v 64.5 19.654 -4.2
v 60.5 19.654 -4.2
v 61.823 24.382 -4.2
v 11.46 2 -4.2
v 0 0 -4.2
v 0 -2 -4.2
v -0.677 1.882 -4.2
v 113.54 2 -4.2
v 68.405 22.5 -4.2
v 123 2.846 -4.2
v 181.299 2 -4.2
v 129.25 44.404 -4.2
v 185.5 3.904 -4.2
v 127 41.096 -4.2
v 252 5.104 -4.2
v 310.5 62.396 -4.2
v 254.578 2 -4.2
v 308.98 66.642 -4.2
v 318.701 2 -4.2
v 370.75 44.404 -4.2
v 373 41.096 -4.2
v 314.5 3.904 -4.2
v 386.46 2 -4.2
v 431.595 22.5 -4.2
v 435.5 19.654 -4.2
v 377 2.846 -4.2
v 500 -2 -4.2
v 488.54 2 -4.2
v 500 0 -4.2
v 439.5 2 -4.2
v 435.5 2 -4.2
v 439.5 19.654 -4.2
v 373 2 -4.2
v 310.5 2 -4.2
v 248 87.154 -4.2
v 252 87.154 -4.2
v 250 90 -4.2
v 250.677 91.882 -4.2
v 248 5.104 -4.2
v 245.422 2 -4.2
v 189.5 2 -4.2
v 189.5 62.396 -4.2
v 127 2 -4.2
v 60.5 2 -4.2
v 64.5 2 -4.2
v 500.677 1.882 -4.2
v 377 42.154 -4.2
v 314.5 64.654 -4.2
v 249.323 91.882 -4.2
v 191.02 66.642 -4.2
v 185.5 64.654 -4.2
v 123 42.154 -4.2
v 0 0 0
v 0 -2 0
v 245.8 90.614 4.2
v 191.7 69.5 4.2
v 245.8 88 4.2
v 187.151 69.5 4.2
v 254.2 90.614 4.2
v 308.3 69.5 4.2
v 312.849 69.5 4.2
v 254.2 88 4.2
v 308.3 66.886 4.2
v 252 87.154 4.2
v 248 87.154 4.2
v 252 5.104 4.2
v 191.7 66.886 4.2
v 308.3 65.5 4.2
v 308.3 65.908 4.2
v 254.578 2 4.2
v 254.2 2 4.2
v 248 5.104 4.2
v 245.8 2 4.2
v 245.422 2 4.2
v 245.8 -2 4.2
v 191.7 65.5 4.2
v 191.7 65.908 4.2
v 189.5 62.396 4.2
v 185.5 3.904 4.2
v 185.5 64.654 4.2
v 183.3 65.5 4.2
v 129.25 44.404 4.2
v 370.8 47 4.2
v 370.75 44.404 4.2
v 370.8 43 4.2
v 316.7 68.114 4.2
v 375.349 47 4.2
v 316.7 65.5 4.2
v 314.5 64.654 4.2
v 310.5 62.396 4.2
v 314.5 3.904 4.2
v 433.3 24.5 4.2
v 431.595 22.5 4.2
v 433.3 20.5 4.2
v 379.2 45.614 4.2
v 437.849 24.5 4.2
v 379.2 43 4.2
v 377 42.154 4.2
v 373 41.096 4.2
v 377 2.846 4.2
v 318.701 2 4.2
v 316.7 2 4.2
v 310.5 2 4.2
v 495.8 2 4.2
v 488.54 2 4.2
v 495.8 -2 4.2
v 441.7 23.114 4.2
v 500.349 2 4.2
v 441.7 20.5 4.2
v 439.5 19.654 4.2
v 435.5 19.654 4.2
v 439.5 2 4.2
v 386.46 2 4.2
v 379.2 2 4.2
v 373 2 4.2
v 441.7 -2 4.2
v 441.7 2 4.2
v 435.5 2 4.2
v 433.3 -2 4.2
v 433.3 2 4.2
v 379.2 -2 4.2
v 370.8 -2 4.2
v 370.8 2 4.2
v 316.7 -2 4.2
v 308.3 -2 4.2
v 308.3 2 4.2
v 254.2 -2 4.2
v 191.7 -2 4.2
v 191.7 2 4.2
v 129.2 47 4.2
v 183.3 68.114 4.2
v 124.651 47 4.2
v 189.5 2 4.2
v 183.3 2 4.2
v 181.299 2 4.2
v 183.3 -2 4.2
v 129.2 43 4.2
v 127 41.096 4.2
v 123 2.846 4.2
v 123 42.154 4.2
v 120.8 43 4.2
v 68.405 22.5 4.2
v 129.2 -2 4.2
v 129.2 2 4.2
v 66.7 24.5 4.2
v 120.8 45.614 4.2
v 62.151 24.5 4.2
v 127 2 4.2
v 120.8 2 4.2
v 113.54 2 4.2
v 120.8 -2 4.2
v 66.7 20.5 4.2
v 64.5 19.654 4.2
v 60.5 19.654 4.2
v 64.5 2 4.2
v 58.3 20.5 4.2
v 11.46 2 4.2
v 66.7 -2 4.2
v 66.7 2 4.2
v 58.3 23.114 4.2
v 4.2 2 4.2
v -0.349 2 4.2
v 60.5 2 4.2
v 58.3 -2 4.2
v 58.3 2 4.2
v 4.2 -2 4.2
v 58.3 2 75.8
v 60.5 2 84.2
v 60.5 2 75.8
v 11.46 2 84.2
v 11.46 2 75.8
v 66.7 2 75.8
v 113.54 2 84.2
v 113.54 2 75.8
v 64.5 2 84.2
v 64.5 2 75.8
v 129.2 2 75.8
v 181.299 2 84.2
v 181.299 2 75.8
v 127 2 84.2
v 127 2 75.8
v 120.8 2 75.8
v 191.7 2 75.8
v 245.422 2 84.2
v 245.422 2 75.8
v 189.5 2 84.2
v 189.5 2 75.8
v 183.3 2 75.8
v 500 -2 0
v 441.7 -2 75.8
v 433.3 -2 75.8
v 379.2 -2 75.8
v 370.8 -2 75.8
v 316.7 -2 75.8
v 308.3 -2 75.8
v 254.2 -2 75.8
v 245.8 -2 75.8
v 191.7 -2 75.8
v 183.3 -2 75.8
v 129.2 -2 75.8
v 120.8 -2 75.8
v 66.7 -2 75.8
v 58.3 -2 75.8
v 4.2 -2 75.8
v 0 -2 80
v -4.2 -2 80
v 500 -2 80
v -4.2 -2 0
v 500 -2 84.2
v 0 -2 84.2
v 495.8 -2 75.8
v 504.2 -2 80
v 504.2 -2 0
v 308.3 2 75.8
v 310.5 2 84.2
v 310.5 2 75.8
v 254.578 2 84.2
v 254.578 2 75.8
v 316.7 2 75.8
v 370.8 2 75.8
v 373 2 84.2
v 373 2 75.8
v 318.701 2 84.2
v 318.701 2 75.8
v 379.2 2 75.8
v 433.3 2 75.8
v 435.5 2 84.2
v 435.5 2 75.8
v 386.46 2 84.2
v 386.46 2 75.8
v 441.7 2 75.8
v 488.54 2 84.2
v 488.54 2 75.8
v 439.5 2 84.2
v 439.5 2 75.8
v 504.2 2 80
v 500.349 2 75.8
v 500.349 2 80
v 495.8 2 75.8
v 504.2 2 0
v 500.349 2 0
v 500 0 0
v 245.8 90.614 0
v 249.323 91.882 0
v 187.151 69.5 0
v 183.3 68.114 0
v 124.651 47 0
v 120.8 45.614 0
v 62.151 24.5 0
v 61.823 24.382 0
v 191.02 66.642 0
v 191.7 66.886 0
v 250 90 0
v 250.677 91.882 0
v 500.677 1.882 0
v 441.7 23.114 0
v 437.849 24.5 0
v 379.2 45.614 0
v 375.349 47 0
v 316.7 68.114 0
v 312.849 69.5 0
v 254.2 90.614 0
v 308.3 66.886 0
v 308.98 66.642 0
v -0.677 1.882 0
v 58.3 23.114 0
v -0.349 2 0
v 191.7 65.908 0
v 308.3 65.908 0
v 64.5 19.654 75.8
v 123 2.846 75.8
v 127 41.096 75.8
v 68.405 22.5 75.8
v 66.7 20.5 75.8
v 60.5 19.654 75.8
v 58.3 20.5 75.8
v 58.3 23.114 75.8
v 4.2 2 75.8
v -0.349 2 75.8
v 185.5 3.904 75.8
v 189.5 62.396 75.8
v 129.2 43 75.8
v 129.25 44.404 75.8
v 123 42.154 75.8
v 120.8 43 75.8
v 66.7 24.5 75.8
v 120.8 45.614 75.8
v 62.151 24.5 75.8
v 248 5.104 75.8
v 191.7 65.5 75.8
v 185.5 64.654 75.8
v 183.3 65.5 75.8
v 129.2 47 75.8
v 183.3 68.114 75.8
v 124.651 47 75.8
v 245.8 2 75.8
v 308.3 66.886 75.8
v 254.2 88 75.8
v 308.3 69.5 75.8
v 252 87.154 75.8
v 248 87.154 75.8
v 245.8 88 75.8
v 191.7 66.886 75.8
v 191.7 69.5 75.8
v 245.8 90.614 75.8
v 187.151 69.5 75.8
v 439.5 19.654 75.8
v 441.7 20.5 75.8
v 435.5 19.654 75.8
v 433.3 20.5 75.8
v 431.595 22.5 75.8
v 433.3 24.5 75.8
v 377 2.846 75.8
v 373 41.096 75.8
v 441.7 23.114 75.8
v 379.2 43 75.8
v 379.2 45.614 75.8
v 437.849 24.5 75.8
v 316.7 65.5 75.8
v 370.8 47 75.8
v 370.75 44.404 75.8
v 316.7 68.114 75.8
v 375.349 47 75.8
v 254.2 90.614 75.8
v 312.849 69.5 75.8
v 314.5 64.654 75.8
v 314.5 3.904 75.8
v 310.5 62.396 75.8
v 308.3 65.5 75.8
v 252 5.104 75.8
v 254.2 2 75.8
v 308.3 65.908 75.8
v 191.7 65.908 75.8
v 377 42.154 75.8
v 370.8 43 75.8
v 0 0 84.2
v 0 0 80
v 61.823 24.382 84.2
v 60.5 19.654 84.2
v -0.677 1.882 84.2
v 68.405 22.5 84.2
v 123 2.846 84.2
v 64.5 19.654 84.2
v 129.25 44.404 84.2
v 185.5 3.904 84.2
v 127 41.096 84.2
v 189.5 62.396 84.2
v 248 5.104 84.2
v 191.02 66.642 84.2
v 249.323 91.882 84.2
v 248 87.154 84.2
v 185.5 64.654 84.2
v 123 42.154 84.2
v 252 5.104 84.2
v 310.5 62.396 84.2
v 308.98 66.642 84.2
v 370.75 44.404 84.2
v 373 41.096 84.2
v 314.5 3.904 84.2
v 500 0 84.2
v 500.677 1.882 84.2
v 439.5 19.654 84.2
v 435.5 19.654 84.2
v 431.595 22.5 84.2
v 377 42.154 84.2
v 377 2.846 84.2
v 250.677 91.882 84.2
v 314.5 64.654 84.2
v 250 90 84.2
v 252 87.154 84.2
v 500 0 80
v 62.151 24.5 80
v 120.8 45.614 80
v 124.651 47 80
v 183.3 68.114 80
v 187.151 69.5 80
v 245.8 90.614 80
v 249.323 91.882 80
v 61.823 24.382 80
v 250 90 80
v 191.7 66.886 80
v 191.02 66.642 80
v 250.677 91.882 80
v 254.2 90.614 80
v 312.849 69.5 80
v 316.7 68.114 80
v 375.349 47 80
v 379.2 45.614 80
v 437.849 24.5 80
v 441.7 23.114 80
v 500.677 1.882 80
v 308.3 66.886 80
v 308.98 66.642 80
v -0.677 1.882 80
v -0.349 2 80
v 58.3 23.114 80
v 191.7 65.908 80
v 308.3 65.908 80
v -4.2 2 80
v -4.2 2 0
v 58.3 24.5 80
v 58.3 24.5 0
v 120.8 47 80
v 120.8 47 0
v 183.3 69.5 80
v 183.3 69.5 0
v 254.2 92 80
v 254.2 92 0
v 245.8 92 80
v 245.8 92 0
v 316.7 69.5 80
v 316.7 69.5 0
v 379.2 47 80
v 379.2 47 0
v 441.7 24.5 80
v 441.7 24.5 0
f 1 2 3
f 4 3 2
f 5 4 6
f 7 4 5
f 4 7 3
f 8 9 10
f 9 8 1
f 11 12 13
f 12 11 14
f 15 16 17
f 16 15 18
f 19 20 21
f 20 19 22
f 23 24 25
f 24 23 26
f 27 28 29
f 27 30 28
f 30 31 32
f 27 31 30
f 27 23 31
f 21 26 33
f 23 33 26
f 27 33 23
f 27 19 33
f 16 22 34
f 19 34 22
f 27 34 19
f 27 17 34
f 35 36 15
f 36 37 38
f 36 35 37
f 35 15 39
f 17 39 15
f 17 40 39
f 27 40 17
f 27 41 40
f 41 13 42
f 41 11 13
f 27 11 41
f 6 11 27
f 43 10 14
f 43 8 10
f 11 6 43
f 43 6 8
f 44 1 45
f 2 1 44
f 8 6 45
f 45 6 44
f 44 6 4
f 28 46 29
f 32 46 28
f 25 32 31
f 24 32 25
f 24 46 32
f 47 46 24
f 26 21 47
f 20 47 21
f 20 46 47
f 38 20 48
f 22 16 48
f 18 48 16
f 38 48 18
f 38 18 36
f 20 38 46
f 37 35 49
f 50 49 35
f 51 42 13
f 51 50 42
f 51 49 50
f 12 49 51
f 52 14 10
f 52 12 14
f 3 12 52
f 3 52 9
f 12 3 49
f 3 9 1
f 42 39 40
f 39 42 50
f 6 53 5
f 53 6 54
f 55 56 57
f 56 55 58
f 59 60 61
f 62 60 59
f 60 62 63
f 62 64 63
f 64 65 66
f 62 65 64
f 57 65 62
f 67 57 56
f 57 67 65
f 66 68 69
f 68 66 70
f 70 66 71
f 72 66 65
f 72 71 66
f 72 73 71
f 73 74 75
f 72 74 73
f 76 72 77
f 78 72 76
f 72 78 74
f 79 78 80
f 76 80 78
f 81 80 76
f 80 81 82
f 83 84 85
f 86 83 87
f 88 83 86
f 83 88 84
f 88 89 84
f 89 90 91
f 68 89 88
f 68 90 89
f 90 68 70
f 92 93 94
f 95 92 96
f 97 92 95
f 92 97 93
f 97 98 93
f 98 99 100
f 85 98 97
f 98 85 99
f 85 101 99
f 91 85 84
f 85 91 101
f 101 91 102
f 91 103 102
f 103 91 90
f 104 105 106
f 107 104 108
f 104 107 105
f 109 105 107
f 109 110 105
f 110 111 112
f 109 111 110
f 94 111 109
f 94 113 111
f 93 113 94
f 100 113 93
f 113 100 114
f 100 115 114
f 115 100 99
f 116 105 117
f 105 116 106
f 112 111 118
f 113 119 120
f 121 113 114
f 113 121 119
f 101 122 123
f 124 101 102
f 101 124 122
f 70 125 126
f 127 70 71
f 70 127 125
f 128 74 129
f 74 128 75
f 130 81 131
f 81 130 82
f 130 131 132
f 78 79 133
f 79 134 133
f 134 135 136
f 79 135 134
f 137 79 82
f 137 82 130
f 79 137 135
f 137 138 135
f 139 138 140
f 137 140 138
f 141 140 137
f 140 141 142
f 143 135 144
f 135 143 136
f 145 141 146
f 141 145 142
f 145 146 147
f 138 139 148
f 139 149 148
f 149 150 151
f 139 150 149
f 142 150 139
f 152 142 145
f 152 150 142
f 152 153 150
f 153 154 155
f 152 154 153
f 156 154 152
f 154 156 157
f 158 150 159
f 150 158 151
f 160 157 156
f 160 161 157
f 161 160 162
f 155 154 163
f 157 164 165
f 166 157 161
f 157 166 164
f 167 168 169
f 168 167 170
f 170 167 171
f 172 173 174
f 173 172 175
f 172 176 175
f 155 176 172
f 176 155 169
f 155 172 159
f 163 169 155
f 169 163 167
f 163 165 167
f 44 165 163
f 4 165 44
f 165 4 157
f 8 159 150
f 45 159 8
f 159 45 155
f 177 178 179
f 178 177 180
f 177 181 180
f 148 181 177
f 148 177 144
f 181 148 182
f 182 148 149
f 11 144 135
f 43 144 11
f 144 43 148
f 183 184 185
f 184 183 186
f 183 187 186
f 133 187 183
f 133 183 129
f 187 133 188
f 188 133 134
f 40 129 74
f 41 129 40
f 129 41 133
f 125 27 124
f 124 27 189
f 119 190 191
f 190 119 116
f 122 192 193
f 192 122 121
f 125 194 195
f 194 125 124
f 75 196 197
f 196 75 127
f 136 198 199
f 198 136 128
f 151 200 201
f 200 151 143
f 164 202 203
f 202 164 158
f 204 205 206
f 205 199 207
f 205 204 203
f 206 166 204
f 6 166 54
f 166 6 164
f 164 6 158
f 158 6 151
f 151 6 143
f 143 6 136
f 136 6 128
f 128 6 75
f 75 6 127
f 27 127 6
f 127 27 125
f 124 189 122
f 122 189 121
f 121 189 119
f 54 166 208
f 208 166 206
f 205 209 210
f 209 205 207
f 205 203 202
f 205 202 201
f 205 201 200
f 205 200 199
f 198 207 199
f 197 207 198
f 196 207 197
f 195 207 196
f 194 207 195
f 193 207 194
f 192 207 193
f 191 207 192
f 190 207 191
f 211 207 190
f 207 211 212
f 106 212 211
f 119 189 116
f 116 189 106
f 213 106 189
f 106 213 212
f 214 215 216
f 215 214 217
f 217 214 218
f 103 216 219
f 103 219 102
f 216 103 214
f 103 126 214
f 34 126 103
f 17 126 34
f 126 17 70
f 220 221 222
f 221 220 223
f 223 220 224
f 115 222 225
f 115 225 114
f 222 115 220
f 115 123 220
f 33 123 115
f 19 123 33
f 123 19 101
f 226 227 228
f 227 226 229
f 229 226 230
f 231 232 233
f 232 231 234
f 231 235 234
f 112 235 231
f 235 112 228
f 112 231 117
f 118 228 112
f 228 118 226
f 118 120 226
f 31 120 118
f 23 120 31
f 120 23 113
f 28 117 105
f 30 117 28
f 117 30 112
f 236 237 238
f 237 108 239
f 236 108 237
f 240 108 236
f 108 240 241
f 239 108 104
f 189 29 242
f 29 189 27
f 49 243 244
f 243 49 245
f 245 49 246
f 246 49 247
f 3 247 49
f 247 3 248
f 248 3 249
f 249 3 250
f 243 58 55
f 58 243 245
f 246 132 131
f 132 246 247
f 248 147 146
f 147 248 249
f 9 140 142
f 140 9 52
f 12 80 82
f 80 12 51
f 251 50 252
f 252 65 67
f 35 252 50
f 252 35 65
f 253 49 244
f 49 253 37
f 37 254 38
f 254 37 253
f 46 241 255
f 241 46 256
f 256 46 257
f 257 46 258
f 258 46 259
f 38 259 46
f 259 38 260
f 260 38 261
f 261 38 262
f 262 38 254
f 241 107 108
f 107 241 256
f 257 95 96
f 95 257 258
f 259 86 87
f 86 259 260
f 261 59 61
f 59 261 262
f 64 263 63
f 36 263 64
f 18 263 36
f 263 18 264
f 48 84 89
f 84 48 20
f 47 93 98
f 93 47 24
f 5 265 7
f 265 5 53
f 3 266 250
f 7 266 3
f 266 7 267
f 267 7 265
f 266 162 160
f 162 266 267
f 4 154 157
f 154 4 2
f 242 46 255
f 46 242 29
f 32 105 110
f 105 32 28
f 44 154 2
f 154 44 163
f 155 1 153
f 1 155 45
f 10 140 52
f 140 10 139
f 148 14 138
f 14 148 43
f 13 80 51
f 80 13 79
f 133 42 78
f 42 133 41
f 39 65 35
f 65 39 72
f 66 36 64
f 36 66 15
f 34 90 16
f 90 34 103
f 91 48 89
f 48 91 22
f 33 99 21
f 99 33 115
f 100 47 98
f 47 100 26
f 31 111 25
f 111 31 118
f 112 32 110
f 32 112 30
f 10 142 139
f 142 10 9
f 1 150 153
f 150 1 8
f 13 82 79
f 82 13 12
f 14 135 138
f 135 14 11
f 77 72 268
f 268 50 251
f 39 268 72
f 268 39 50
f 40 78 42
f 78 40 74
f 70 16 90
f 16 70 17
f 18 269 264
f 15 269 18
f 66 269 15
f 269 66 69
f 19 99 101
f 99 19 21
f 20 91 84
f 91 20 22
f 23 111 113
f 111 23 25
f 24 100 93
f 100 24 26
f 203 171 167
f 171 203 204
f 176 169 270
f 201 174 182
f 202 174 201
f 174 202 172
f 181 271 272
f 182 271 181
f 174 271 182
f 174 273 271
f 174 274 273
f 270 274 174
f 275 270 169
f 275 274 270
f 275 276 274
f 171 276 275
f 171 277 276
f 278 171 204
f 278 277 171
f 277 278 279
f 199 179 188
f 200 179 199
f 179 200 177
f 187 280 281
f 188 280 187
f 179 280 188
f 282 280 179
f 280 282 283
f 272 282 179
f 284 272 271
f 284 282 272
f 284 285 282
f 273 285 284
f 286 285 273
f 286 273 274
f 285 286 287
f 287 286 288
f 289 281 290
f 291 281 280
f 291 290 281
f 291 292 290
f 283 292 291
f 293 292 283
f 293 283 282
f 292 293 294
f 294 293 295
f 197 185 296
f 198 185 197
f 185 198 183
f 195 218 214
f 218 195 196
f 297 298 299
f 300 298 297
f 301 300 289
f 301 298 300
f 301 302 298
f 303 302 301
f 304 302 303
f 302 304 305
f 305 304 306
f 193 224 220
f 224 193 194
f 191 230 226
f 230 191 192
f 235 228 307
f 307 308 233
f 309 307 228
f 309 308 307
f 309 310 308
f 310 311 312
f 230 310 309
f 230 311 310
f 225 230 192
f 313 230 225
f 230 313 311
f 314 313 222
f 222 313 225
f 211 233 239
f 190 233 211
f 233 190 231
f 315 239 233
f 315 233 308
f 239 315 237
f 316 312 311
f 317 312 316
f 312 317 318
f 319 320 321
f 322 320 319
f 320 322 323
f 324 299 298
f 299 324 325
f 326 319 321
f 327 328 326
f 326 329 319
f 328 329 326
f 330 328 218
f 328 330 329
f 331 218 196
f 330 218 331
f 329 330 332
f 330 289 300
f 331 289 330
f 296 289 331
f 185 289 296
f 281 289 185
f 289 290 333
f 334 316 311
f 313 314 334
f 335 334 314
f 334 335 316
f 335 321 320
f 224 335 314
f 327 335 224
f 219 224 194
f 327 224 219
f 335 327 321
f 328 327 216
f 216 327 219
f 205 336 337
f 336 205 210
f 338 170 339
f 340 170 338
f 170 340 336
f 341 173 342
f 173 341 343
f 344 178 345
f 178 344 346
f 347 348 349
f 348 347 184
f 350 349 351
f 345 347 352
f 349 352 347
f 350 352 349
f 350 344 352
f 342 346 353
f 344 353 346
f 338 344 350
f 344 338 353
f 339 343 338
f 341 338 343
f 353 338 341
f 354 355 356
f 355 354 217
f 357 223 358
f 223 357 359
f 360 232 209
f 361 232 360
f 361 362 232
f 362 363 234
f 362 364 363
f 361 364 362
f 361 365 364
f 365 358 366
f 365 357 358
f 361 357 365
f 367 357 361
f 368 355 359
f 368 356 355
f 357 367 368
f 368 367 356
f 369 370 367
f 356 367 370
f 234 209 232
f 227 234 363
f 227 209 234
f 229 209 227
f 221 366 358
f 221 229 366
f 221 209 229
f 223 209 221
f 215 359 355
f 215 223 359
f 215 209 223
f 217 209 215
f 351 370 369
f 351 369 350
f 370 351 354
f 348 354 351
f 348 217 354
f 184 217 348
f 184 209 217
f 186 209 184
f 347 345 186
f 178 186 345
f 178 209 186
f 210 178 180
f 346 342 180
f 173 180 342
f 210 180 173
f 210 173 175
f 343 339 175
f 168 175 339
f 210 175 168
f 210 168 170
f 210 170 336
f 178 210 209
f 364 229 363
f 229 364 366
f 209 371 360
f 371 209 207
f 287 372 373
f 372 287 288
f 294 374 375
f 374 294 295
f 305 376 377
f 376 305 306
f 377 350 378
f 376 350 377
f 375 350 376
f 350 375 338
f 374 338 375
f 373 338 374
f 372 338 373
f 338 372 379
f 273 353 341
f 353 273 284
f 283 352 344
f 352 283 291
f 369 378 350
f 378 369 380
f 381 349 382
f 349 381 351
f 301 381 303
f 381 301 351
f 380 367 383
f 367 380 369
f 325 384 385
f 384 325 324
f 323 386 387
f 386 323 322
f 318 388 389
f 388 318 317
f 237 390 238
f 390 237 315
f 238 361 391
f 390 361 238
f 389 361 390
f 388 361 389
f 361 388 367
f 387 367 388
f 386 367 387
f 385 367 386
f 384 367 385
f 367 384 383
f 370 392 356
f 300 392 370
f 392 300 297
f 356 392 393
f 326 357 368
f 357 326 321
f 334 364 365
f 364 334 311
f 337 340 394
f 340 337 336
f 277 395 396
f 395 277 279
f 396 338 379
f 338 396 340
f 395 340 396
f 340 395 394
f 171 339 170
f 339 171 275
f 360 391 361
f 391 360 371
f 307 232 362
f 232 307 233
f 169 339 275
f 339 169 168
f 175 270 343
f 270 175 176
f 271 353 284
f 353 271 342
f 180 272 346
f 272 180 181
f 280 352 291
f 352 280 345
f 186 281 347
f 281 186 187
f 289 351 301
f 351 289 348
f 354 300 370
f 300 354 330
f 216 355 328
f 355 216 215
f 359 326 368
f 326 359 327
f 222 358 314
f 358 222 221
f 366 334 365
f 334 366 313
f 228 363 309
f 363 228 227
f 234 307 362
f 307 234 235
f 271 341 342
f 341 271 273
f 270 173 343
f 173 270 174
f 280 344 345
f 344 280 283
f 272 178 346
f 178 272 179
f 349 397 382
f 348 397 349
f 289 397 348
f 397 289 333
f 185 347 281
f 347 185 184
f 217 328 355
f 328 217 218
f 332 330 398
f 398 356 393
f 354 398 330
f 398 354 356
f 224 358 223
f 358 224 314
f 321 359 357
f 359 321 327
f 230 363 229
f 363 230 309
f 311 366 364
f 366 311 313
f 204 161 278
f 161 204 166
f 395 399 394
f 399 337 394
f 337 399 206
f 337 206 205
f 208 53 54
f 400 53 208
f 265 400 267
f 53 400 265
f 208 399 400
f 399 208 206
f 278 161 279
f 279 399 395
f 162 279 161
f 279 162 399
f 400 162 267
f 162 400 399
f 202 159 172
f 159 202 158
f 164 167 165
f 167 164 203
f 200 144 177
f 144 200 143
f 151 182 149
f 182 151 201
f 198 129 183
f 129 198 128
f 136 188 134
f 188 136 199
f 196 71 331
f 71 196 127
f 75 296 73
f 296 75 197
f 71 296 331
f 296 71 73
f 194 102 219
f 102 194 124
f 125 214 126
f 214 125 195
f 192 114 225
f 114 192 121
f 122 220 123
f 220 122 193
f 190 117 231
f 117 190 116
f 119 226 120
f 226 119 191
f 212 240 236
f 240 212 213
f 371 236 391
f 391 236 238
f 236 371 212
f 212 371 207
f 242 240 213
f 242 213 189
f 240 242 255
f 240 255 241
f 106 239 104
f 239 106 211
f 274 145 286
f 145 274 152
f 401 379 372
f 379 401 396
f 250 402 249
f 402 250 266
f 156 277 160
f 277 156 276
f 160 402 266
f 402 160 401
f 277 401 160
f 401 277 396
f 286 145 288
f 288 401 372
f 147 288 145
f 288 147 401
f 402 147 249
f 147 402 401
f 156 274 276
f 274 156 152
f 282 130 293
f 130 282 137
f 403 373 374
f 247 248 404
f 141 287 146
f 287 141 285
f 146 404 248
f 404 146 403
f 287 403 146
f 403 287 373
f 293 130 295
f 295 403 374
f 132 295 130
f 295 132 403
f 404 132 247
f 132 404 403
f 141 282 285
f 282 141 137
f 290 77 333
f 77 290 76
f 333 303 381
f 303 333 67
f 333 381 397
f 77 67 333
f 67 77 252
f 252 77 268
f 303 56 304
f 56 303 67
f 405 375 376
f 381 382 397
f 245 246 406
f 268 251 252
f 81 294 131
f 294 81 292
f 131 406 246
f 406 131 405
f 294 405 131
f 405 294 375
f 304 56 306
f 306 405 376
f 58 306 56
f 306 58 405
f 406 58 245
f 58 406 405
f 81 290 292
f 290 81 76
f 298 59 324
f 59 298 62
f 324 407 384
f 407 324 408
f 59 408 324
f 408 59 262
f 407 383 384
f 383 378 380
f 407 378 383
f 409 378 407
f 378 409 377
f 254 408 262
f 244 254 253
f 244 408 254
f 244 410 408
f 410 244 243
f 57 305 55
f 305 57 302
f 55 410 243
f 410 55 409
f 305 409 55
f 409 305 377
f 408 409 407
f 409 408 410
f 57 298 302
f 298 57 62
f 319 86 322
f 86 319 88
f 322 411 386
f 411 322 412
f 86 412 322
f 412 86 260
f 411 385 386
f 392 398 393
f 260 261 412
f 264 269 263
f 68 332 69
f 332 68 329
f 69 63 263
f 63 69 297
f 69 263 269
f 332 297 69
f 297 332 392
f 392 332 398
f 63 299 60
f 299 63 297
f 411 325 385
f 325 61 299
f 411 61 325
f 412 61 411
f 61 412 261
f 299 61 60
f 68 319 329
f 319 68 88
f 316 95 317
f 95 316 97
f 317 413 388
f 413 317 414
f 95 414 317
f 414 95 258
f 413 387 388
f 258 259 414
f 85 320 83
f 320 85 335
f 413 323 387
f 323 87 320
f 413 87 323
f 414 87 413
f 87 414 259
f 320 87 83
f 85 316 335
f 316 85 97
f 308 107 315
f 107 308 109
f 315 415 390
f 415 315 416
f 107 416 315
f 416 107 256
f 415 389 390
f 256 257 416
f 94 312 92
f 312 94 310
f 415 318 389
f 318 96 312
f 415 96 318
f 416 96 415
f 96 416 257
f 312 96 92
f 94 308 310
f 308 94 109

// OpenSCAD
// gerado por json2scad.py — seção 8.4 x 4.0 mm
b=8.4; h=4.0;
module barra(p1,p2){ d=p2-p1; L=norm(d);
  translate(p1) rotate([0,acos(d[2]/L),atan2(d[1],d[0])])
  translate([-b/2,-h/2,0]) cube([b,h,L]); }
barra([0.0, 0.0, 0.0],[62.5, 0.0, 0.0]);
barra([62.5, 0.0, 0.0],[125.0, 0.0, 0.0]);
barra([125.0, 0.0, 0.0],[187.5, 0.0, 0.0]);
barra([187.5, 0.0, 0.0],[250.0, 0.0, 0.0]);
barra([250.0, 0.0, 0.0],[312.5, 0.0, 0.0]);
barra([312.5, 0.0, 0.0],[375.0, 0.0, 0.0]);
barra([375.0, 0.0, 0.0],[437.5, 0.0, 0.0]);
barra([437.5, 0.0, 0.0],[500.0, 0.0, 0.0]);
barra([62.5, 22.5, 0.0],[125.0, 45.0, 0.0]);
barra([125.0, 45.0, 0.0],[187.5, 67.5, 0.0]);
barra([187.5, 67.5, 0.0],[250.0, 90.0, 0.0]);
barra([250.0, 90.0, 0.0],[312.5, 67.5, 0.0]);
barra([312.5, 67.5, 0.0],[375.0, 45.0, 0.0]);
barra([375.0, 45.0, 0.0],[437.5, 22.5, 0.0]);
barra([0.0, 0.0, 0.0],[62.5, 22.5, 0.0]);
barra([437.5, 22.5, 0.0],[500.0, 0.0, 0.0]);
barra([62.5, 0.0, 0.0],[62.5, 22.5, 0.0]);
barra([125.0, 0.0, 0.0],[125.0, 45.0, 0.0]);
barra([187.5, 0.0, 0.0],[187.5, 67.5, 0.0]);
barra([250.0, 0.0, 0.0],[250.0, 90.0, 0.0]);
barra([312.5, 0.0, 0.0],[312.5, 67.5, 0.0]);
barra([375.0, 0.0, 0.0],[375.0, 45.0, 0.0]);
barra([437.5, 0.0, 0.0],[437.5, 22.5, 0.0]);
barra([62.5, 22.5, 0.0],[125.0, 0.0, 0.0]);
barra([125.0, 45.0, 0.0],[187.5, 0.0, 0.0]);
barra([187.5, 67.5, 0.0],[250.0, 0.0, 0.0]);
barra([312.5, 67.5, 0.0],[250.0, 0.0, 0.0]);
barra([375.0, 45.0, 0.0],[312.5, 0.0, 0.0]);
barra([437.5, 22.5, 0.0],[375.0, 0.0, 0.0]);
barra([0.0, 0.0, 80.0],[62.5, 0.0, 80.0]);
barra([62.5, 0.0, 80.0],[125.0, 0.0, 80.0]);
barra([125.0, 0.0, 80.0],[187.5, 0.0, 80.0]);
barra([187.5, 0.0, 80.0],[250.0, 0.0, 80.0]);
barra([250.0, 0.0, 80.0],[312.5, 0.0, 80.0]);
barra([312.5, 0.0, 80.0],[375.0, 0.0, 80.0]);
barra([375.0, 0.0, 80.0],[437.5, 0.0, 80.0]);
barra([437.5, 0.0, 80.0],[500.0, 0.0, 80.0]);
barra([62.5, 22.5, 80.0],[125.0, 45.0, 80.0]);
barra([125.0, 45.0, 80.0],[187.5, 67.5, 80.0]);
barra([187.5, 67.5, 80.0],[250.0, 90.0, 80.0]);
barra([250.0, 90.0, 80.0],[312.5, 67.5, 80.0]);
barra([312.5, 67.5, 80.0],[375.0, 45.0, 80.0]);
barra([375.0, 45.0, 80.0],[437.5, 22.5, 80.0]);
barra([0.0, 0.0, 80.0],[62.5, 22.5, 80.0]);
barra([437.5, 22.5, 80.0],[500.0, 0.0, 80.0]);
barra([62.5, 0.0, 80.0],[62.5, 22.5, 80.0]);
barra([125.0, 0.0, 80.0],[125.0, 45.0, 80.0]);
barra([187.5, 0.0, 80.0],[187.5, 67.5, 80.0]);
barra([250.0, 0.0, 80.0],[250.0, 90.0, 80.0]);
barra([312.5, 0.0, 80.0],[312.5, 67.5, 80.0]);
barra([375.0, 0.0, 80.0],[375.0, 45.0, 80.0]);
barra([437.5, 0.0, 80.0],[437.5, 22.5, 80.0]);
barra([62.5, 22.5, 80.0],[125.0, 0.0, 80.0]);
barra([125.0, 45.0, 80.0],[187.5, 0.0, 80.0]);
barra([187.5, 67.5, 80.0],[250.0, 0.0, 80.0]);
barra([312.5, 67.5, 80.0],[250.0, 0.0, 80.0]);
barra([375.0, 45.0, 80.0],[312.5, 0.0, 80.0]);
barra([437.5, 22.5, 80.0],[375.0, 0.0, 80.0]);
barra([0.0, 0.0, 0.0],[0.0, 0.0, 80.0]);
barra([62.5, 0.0, 0.0],[62.5, 0.0, 80.0]);
barra([125.0, 0.0, 0.0],[125.0, 0.0, 80.0]);
barra([187.5, 0.0, 0.0],[187.5, 0.0, 80.0]);
barra([250.0, 0.0, 0.0],[250.0, 0.0, 80.0]);
barra([312.5, 0.0, 0.0],[312.5, 0.0, 80.0]);
barra([375.0, 0.0, 0.0],[375.0, 0.0, 80.0]);
barra([437.5, 0.0, 0.0],[437.5, 0.0, 80.0]);
barra([500.0, 0.0, 0.0],[500.0, 0.0, 80.0]);
barra([62.5, 22.5, 0.0],[62.5, 22.5, 80.0]);
barra([125.0, 45.0, 0.0],[125.0, 45.0, 80.0]);
barra([187.5, 67.5, 0.0],[187.5, 67.5, 80.0]);
barra([250.0, 90.0, 0.0],[250.0, 90.0, 80.0]);
barra([312.5, 67.5, 0.0],[312.5, 67.5, 80.0]);
barra([375.0, 45.0, 0.0],[375.0, 45.0, 80.0]);
barra([437.5, 22.5, 0.0],[437.5, 22.5, 80.0]);
